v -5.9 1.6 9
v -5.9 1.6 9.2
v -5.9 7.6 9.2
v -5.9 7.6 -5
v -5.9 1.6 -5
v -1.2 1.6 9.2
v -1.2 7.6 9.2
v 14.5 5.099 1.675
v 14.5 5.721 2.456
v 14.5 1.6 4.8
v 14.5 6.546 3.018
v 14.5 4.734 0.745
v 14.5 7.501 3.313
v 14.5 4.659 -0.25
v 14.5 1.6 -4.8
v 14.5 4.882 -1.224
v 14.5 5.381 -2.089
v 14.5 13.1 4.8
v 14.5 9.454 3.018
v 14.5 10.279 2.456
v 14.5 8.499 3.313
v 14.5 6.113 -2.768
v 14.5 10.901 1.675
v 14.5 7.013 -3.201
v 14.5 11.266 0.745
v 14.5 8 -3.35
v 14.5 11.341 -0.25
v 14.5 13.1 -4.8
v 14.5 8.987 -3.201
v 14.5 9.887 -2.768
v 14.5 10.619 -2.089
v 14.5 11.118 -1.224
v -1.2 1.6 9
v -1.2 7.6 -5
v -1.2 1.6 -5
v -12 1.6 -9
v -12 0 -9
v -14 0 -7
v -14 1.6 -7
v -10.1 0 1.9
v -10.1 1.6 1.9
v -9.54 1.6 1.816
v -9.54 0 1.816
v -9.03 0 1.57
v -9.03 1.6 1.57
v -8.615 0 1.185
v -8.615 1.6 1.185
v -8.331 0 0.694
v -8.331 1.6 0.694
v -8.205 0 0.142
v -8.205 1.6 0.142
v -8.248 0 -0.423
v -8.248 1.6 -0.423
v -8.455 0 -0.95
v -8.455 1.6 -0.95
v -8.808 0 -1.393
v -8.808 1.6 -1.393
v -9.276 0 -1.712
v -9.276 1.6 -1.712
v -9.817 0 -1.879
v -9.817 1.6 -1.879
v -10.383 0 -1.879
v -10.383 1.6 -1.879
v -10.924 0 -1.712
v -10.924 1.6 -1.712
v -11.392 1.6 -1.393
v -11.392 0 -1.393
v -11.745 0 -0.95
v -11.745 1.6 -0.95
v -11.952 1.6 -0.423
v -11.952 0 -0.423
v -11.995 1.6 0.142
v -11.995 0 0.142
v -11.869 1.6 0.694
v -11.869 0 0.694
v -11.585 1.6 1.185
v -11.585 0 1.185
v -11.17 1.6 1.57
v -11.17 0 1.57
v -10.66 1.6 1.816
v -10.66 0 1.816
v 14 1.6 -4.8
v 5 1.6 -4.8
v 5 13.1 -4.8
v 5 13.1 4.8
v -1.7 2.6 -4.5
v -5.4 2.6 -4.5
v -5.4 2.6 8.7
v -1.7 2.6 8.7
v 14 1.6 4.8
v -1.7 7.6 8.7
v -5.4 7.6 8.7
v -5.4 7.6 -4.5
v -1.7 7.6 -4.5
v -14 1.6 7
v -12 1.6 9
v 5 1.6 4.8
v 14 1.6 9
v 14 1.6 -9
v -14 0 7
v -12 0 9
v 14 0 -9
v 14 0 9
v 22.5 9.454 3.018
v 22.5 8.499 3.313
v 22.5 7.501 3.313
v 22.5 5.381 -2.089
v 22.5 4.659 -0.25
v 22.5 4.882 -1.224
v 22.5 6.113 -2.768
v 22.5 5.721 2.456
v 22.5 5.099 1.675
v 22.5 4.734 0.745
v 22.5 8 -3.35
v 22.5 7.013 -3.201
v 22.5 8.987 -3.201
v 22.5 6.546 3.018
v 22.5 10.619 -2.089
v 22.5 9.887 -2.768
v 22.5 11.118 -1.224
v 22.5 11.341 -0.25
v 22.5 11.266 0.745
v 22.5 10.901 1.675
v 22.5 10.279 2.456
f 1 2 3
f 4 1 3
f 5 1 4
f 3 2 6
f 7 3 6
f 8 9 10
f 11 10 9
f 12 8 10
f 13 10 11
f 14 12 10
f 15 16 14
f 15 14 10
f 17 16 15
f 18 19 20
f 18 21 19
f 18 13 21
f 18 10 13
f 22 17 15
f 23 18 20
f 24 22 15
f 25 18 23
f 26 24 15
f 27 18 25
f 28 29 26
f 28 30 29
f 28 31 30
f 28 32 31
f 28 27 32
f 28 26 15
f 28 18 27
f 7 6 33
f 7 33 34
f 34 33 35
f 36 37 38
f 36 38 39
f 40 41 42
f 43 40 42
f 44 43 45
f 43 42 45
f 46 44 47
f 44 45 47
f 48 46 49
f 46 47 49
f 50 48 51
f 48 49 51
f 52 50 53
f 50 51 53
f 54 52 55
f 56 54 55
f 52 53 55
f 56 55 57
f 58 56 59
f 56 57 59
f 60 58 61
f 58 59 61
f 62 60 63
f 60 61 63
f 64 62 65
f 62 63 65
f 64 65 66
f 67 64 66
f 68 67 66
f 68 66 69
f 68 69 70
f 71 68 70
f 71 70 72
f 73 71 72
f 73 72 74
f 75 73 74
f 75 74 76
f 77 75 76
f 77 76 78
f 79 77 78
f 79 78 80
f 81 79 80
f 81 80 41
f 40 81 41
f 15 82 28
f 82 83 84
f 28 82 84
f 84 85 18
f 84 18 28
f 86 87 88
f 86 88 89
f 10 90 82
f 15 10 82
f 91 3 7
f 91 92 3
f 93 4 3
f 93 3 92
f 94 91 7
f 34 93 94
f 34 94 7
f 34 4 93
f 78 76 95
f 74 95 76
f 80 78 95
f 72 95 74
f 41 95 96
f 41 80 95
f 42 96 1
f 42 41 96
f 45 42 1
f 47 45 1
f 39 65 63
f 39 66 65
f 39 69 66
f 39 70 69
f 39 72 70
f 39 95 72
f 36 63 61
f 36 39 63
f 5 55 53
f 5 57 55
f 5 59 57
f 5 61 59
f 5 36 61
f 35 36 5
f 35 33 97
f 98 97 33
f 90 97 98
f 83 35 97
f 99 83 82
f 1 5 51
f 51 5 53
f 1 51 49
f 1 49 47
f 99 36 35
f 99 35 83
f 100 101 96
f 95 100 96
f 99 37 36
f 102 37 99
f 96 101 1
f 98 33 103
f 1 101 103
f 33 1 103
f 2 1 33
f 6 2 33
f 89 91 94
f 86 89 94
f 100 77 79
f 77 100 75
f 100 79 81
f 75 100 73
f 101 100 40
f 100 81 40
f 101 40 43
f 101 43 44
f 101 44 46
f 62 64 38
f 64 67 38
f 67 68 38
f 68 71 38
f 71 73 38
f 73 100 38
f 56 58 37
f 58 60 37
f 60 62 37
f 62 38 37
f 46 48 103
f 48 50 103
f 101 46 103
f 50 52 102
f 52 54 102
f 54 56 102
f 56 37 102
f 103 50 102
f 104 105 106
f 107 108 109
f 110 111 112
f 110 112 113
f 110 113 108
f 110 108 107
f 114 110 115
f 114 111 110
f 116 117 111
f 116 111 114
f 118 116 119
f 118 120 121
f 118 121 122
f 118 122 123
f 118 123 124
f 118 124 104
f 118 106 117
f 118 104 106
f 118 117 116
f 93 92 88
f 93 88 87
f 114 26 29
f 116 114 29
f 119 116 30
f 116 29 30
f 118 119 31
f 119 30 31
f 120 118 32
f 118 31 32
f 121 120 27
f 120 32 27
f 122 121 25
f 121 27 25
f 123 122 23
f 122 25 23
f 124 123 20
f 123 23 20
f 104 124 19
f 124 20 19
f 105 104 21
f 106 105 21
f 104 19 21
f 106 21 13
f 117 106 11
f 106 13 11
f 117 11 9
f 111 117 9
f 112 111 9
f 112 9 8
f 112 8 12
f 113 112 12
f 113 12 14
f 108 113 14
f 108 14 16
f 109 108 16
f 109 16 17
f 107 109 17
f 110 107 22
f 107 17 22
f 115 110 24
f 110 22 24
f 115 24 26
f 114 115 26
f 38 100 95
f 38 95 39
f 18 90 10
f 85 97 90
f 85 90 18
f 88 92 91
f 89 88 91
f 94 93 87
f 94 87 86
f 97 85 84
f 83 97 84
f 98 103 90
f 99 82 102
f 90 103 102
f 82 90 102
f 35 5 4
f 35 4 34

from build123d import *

# Parameters (mm, degrees)
SKETCH2_W                = 28
SKETCH2_H                = 18
BOSS_EXTRUDE1_DEPTH      = 1.6
BOSS_EXTRUDE2_DEPTH      = 0.5
BOSS_EXTRUDE2_DEPTH_BACK = 9
SKETCH4_W                = 9.6
SKETCH4_H                = 11.5
SKETCH5_R                = 3.35
BOSS_EXTRUDE3_DEPTH      = 8
SKETCH6_W                = 4.7
SKETCH6_H                = 14.2
BOSS_EXTRUDE4_DEPTH      = 6
SKETCH7_R                = 1.9
CUT_EXTRUDE1_DEPTH       = 27.891262521
CHAMFER1_SIZE            = 2
SKETCH8_W                = 3.7
SKETCH8_H                = 13.2
CUT_EXTRUDE2_DEPTH       = 5


with BuildPart() as part:
    # Sketch2 → Boss-Extrude1 (new body)
    with BuildSketch(Plane(origin=(0, 0, 0), x_dir=(1, 0, 0), z_dir=(0, 1, 0))):
        Rectangle(SKETCH2_W, SKETCH2_H)
    extrude(amount=BOSS_EXTRUDE1_DEPTH)

    # Sketch4 → Boss-Extrude2 (add, two sides: drawn at the far end of the back side and taken through both)
    with BuildSketch(Plane(origin=(14, 0, 0), x_dir=(0, 0, -1), z_dir=(1, 0, 0)).offset(-BOSS_EXTRUDE2_DEPTH_BACK)):
        with Locations((0, 7.35)):
            Rectangle(SKETCH4_W, SKETCH4_H)
    extrude(amount=BOSS_EXTRUDE2_DEPTH + BOSS_EXTRUDE2_DEPTH_BACK)

    # Sketch5 → Boss-Extrude3 (add)
    with BuildSketch(Plane(origin=(14.5, 0, 0), x_dir=(0, 0, -1), z_dir=(1, 0, 0))):
        with Locations((0, 8)):
            Circle(SKETCH5_R)
    extrude(amount=BOSS_EXTRUDE3_DEPTH)

    # Sketch6 → Boss-Extrude4 (add)
    with BuildSketch(Plane(origin=(0, 1.6, 0), x_dir=(1, 0, 0), z_dir=(0, 1, 0))):
        with Locations((-3.55, -2.1)):
            Rectangle(SKETCH6_W, SKETCH6_H)
    extrude(amount=BOSS_EXTRUDE4_DEPTH)

    # Sketch7 → Cut-Extrude1 (cut, through all)
    with BuildSketch(Plane(origin=(0, 1.6, 0), x_dir=(1, 0, 0), z_dir=(0, 1, 0))):
        with Locations(Location((-10.1, 0, 0), (0, 0, 270))):
            Circle(SKETCH7_R)
    extrude(amount=-CUT_EXTRUDE1_DEPTH, mode=Mode.SUBTRACT)

    # Chamfer1
    chamfer1_edges = [part.edges().sort_by_distance(p)[0] for p in [
        (-14, 0.8, -9),
        (-14, 0.8, 9),
    ]]
    chamfer(chamfer1_edges, length=CHAMFER1_SIZE)

    # Sketch8 → Cut-Extrude2 (cut)
    with BuildSketch(Plane(origin=(0, 7.6, 0), x_dir=(1, 0, 0), z_dir=(0, 1, 0))):
        with Locations((-3.55, -2.1)):
            Rectangle(SKETCH8_W, SKETCH8_H)
    extrude(amount=-CUT_EXTRUDE2_DEPTH, mode=Mode.SUBTRACT)


solid = part.part
